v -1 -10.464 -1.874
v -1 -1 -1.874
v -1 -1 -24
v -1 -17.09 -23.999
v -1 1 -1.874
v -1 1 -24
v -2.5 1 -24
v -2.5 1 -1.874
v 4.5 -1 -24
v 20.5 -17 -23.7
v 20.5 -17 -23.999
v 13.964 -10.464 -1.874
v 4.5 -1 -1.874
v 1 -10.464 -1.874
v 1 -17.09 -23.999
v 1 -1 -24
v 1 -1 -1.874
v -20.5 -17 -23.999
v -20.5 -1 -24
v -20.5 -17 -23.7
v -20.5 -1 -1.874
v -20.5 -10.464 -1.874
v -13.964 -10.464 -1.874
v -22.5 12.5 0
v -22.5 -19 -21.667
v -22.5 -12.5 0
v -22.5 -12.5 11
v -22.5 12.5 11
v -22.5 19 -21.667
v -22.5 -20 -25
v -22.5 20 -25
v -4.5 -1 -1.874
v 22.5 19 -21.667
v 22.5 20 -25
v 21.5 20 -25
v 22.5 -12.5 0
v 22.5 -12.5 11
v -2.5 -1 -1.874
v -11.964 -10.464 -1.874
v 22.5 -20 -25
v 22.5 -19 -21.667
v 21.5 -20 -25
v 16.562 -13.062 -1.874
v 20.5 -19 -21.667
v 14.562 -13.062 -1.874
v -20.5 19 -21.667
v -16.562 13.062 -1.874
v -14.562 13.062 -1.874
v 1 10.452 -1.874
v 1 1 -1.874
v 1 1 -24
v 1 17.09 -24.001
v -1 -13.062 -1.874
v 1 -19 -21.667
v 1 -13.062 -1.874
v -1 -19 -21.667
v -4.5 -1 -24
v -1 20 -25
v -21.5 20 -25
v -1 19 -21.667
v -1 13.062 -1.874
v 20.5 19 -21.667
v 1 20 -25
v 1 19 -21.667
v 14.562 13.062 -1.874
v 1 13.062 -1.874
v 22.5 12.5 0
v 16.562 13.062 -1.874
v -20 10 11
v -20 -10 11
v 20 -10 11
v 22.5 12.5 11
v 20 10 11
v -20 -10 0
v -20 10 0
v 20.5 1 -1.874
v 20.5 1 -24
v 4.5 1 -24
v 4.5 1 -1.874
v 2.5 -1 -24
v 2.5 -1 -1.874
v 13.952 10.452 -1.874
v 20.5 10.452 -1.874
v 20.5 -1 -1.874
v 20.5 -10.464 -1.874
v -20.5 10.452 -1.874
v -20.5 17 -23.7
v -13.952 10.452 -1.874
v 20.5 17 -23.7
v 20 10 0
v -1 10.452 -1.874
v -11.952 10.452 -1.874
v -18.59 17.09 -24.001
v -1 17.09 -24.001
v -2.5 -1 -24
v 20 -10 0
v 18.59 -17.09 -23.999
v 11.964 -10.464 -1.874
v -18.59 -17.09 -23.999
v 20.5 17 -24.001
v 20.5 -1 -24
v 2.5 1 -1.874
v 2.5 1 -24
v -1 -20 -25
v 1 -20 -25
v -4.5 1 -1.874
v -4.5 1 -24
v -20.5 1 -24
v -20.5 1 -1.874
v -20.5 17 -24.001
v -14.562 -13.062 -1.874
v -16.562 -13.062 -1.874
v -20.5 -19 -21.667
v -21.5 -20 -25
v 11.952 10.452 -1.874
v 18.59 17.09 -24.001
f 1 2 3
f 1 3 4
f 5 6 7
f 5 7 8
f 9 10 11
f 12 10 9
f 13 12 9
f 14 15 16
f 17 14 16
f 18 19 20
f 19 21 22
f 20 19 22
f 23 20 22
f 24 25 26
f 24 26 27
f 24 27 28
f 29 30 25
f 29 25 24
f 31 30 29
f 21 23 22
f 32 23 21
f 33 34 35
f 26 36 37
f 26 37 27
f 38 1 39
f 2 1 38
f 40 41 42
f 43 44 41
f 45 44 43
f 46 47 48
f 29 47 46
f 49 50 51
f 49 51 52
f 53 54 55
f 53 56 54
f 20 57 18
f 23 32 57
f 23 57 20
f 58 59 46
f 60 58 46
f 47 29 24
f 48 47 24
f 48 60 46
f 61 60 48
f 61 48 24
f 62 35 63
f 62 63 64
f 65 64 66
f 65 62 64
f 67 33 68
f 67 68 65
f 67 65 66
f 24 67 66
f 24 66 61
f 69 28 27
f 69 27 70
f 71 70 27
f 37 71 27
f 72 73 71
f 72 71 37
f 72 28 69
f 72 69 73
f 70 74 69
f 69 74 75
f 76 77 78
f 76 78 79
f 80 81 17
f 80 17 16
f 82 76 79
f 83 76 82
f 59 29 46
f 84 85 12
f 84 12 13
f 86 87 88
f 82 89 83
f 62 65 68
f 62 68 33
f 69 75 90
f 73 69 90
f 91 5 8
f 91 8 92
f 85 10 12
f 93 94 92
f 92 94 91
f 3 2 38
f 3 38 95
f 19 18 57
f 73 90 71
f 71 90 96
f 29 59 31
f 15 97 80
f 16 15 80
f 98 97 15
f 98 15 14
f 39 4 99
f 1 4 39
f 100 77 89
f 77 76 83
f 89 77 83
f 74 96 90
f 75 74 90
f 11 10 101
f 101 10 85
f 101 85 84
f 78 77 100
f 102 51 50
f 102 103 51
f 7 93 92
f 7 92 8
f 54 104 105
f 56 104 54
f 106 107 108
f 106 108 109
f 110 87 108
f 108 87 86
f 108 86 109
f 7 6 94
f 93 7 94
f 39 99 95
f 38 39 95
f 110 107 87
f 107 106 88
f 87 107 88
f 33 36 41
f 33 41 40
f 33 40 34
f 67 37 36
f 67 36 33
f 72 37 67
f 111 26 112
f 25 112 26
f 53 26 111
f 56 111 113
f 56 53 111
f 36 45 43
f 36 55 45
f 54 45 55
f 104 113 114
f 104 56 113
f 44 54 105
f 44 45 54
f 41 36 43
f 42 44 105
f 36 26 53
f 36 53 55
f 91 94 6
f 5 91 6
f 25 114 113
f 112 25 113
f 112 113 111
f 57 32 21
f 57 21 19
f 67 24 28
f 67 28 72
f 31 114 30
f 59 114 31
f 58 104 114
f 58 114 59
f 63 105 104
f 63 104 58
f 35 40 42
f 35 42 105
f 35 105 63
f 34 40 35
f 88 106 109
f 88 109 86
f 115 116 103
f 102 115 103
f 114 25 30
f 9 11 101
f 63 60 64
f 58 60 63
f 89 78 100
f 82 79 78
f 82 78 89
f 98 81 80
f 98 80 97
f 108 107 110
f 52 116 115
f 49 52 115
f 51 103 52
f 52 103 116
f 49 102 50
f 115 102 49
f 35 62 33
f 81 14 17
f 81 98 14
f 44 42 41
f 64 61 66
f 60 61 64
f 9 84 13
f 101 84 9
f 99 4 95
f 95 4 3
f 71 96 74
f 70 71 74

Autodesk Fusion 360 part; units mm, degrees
sketch "Sketch1" plane through (0, 0, 0) normal (0, 0, 1) x (1, 0, 0)
  line L0 (20, -10) -> (-20, -10)
  line L1 (-20, -10) -> (-20, 10)
  line L2 (-20, 10) -> (20, 10)
  line L3 (20, 10) -> (20, -10)
  line L4 (20, -10) -> (-20, 10) construction
  line L5 (-20, -10) -> (20, 10) construction
  line L6 (22.5, -12.5) -> (-22.5, -12.5)
  line L7 (-22.5, -12.5) -> (-22.5, 12.5)
  line L8 (-22.5, 12.5) -> (22.5, 12.5)
  line L9 (22.5, 12.5) -> (22.5, -12.5)
  line L10 (22.5, -12.5) -> (-22.5, 12.5) construction
  line L11 (-22.5, -12.5) -> (22.5, 12.5) construction
  dimension "d1" = 40
  dimension "d2" = 20
  dimension "d3" = 45
  dimension "d4" = 25
extrude "Extrude1" add sketch "Sketch1" along normal blind 11 makes body 1
sketch "Sketch4" plane through (22.5, 0, 0) normal (1, 0, 0) x (0, 1, 0)
  line L0 (-12.5, 0) -> (12.5, 0)
  line L1 (12.5, 0) -> (12.5, 11)
  line L2 (12.5, 11) -> (-12.5, 11)
  line L3 (-12.5, 11) -> (-12.5, 0)
  line L4 (-12.5, 0) -> (12.281, 0) construction
  line L5 (-12.5, 0) -> (-20, -25)
  line L6 (-20, -25) -> (20, -25)
  line L7 (20, -25) -> (12.5, 0)
  line L8 (12.5, 0) -> (20, -25) construction
  line L9 (12.281, -0.0657) -> (12.5, 0) construction
  line L10 (-12.5, 0) -> (-20, -25) construction
  line L11 (17.0904, -24.0014) -> (10.4521, -1.8738)
  line L12 (-17.0895, -23.9987) -> (-10.4636, -1.8738) construction
  line L13 (-1, -1.8738) -> (-1, -24)
  line L14 (1, -24.0002) -> (1, -1.8738)
  line L15 (-17.0895, -23.9987) -> (-1, -24)
  line L16 (1, -24.0002) -> (17.0904, -24.0014)
  line L17 (17.0904, -24.0014) -> (10.4521, -1.8738) construction
  line L18 (9.8899, 0) -> (9.2425, 2.1581) construction
  line L19 (-17.0895, -23.9987) -> (-10.4636, -1.8738)
  line L20 (-10.4636, -1.8738) -> (-1, -1.8738)
  line L21 (1, -1.8738) -> (10.4521, -1.8738)
extrude "Extrude10" add sketch "Sketch4" against normal blind 2 separate body contours L11 L14 L16 L21 | L13 L15 L19 L20 makes body 2 at (22.5, 9.5141, -16.6251) makes body 3 at (22.5, -9.5177, -16.6242)
extrude "Extrude8" add sketch "Sketch4" against normal up to surface (45 mm away) contours L0 L5 L6 L7 bodies 1
sketch "Sketch9" plane through (0, 0, -1.8738) normal (0, 0, -1) x (1, 0, 0)
  line L0 (-22.5, 10.4636) -> (-22.5, 1)
  line L1 (-22.5, 1) -> (22.5, 1)
  line L2 (22.5, 1) -> (22.5, 10.4636)
  line L3 (22.5, 10.4636) -> (-22.5, 10.4636)
  line L4 (-1, 20) -> (1, 20)
  line L5 (1, 20) -> (1, -20)
  line L6 (1, -20) -> (-1, -20)
  line L7 (-1, -20) -> (-1, 20)
  line L8 (-22.5, 19) -> (-21.5, 20)
  line L9 (-21.5, 20) -> (-2, 0.5)
  line L10 (-2, 0.5) -> (-3, -0.5)
  line L11 (-3, -0.5) -> (-22.5, 19)
  line L12 (-22.5, -19) -> (-21.5, -20)
  line L13 (-21.5, -20) -> (-2, -0.5)
  line L14 (-2, -0.5) -> (-3, 0.5)
  line L15 (-3, 0.5) -> (-22.5, -19)
  line L16 (22.5, -19) -> (21.5, -20)
  line L17 (21.5, -20) -> (1.9964, -0.4964)
  line L18 (1.9964, -0.4964) -> (2.9964, 0.5036)
  line L19 (2.9964, 0.5036) -> (22.5, -19)
  line L20 (21.5, 20) -> (22.5, 19)
  line L21 (22.5, 19) -> (2.5, -1)
  line L22 (2.5, -1) -> (1.5, 0)
  line L23 (1.5, 0) -> (21.5, 20)
extrude "Extrude9" add sketch "Sketch9" along normal up to surface (23.1262 mm away) contours L3 L8 L9 L11 | L1 L3 L9 L11 | L1 L9 L10 L11 L14 L15 | L10 L11 L14 L15 | L10 L11 L12 L13 L14 L15 | L3 L4 L5 L7 | L1 L3 L5 L7 | L1 L5 L6 L7 | L3 L20 L21 L23 | L1 L3 L21 L23 | L1 L18 L19 L21 L22 L23 | L17 L18 L19 L21 L22 | L16 L17 L19 L21 bodies 1
sketch "Sketch10" plane through (-22.5, 0, 0) normal (-1, 0, 0) x (0, -1, 0)
  line L0 (-1, -1.8738) -> (-1, -24.0002)
  line L1 (-1, -24.0002) -> (-17.0904, -24.0014)
  line L2 (-17.0904, -24.0014) -> (-10.4521, -1.8738)
  line L3 (-10.4521, -1.8738) -> (-1, -1.8738)
  line L4 (10.4636, -1.8738) -> (17.0895, -23.9987)
  line L5 (17.0895, -23.9987) -> (1, -24)
  line L6 (1, -24) -> (1, -1.8738)
  line L7 (1, -1.8738) -> (10.4636, -1.8738)
  line L8 (-19, -21.6667) -> (-20, -25)
  line L9 (-20, -25) -> (20, -25)
  line L10 (20, -25) -> (19, -21.6667)
  line L11 (19, -21.6667) -> (12.5, 0)
  line L12 (12.5, 0) -> (12.5, 11)
  line L13 (12.5, 11) -> (-12.5, 11)
  line L14 (-12.5, 11) -> (-12.5, 0)
  line L15 (-12.5, 0) -> (-19, -21.6667)
  line L16 (-25.8354, 18.4889) -> (28, 18.4889)
  line L17 (28, 18.4889) -> (28, -29)
  line L18 (28, -29) -> (-25.8354, -29)
  line L19 (-25.8354, -29) -> (-25.8354, 18.4889)
extrude "Extrude12" cut sketch "Sketch10" against normal blind 74 contours L16 L17 L18 L19 bodies 1
extrude "Extrude11" add sketch "Sketch10" against normal blind 2 contours L0 L1 L2 L3 | L4 L5 L6 L7 bodies 1
combine "Combine2" operation add target body 1 tool bodies 2 3
equation "d3 = 40 mm + 5 mm"
equation "d4 = 20 mm + 5 mm"
